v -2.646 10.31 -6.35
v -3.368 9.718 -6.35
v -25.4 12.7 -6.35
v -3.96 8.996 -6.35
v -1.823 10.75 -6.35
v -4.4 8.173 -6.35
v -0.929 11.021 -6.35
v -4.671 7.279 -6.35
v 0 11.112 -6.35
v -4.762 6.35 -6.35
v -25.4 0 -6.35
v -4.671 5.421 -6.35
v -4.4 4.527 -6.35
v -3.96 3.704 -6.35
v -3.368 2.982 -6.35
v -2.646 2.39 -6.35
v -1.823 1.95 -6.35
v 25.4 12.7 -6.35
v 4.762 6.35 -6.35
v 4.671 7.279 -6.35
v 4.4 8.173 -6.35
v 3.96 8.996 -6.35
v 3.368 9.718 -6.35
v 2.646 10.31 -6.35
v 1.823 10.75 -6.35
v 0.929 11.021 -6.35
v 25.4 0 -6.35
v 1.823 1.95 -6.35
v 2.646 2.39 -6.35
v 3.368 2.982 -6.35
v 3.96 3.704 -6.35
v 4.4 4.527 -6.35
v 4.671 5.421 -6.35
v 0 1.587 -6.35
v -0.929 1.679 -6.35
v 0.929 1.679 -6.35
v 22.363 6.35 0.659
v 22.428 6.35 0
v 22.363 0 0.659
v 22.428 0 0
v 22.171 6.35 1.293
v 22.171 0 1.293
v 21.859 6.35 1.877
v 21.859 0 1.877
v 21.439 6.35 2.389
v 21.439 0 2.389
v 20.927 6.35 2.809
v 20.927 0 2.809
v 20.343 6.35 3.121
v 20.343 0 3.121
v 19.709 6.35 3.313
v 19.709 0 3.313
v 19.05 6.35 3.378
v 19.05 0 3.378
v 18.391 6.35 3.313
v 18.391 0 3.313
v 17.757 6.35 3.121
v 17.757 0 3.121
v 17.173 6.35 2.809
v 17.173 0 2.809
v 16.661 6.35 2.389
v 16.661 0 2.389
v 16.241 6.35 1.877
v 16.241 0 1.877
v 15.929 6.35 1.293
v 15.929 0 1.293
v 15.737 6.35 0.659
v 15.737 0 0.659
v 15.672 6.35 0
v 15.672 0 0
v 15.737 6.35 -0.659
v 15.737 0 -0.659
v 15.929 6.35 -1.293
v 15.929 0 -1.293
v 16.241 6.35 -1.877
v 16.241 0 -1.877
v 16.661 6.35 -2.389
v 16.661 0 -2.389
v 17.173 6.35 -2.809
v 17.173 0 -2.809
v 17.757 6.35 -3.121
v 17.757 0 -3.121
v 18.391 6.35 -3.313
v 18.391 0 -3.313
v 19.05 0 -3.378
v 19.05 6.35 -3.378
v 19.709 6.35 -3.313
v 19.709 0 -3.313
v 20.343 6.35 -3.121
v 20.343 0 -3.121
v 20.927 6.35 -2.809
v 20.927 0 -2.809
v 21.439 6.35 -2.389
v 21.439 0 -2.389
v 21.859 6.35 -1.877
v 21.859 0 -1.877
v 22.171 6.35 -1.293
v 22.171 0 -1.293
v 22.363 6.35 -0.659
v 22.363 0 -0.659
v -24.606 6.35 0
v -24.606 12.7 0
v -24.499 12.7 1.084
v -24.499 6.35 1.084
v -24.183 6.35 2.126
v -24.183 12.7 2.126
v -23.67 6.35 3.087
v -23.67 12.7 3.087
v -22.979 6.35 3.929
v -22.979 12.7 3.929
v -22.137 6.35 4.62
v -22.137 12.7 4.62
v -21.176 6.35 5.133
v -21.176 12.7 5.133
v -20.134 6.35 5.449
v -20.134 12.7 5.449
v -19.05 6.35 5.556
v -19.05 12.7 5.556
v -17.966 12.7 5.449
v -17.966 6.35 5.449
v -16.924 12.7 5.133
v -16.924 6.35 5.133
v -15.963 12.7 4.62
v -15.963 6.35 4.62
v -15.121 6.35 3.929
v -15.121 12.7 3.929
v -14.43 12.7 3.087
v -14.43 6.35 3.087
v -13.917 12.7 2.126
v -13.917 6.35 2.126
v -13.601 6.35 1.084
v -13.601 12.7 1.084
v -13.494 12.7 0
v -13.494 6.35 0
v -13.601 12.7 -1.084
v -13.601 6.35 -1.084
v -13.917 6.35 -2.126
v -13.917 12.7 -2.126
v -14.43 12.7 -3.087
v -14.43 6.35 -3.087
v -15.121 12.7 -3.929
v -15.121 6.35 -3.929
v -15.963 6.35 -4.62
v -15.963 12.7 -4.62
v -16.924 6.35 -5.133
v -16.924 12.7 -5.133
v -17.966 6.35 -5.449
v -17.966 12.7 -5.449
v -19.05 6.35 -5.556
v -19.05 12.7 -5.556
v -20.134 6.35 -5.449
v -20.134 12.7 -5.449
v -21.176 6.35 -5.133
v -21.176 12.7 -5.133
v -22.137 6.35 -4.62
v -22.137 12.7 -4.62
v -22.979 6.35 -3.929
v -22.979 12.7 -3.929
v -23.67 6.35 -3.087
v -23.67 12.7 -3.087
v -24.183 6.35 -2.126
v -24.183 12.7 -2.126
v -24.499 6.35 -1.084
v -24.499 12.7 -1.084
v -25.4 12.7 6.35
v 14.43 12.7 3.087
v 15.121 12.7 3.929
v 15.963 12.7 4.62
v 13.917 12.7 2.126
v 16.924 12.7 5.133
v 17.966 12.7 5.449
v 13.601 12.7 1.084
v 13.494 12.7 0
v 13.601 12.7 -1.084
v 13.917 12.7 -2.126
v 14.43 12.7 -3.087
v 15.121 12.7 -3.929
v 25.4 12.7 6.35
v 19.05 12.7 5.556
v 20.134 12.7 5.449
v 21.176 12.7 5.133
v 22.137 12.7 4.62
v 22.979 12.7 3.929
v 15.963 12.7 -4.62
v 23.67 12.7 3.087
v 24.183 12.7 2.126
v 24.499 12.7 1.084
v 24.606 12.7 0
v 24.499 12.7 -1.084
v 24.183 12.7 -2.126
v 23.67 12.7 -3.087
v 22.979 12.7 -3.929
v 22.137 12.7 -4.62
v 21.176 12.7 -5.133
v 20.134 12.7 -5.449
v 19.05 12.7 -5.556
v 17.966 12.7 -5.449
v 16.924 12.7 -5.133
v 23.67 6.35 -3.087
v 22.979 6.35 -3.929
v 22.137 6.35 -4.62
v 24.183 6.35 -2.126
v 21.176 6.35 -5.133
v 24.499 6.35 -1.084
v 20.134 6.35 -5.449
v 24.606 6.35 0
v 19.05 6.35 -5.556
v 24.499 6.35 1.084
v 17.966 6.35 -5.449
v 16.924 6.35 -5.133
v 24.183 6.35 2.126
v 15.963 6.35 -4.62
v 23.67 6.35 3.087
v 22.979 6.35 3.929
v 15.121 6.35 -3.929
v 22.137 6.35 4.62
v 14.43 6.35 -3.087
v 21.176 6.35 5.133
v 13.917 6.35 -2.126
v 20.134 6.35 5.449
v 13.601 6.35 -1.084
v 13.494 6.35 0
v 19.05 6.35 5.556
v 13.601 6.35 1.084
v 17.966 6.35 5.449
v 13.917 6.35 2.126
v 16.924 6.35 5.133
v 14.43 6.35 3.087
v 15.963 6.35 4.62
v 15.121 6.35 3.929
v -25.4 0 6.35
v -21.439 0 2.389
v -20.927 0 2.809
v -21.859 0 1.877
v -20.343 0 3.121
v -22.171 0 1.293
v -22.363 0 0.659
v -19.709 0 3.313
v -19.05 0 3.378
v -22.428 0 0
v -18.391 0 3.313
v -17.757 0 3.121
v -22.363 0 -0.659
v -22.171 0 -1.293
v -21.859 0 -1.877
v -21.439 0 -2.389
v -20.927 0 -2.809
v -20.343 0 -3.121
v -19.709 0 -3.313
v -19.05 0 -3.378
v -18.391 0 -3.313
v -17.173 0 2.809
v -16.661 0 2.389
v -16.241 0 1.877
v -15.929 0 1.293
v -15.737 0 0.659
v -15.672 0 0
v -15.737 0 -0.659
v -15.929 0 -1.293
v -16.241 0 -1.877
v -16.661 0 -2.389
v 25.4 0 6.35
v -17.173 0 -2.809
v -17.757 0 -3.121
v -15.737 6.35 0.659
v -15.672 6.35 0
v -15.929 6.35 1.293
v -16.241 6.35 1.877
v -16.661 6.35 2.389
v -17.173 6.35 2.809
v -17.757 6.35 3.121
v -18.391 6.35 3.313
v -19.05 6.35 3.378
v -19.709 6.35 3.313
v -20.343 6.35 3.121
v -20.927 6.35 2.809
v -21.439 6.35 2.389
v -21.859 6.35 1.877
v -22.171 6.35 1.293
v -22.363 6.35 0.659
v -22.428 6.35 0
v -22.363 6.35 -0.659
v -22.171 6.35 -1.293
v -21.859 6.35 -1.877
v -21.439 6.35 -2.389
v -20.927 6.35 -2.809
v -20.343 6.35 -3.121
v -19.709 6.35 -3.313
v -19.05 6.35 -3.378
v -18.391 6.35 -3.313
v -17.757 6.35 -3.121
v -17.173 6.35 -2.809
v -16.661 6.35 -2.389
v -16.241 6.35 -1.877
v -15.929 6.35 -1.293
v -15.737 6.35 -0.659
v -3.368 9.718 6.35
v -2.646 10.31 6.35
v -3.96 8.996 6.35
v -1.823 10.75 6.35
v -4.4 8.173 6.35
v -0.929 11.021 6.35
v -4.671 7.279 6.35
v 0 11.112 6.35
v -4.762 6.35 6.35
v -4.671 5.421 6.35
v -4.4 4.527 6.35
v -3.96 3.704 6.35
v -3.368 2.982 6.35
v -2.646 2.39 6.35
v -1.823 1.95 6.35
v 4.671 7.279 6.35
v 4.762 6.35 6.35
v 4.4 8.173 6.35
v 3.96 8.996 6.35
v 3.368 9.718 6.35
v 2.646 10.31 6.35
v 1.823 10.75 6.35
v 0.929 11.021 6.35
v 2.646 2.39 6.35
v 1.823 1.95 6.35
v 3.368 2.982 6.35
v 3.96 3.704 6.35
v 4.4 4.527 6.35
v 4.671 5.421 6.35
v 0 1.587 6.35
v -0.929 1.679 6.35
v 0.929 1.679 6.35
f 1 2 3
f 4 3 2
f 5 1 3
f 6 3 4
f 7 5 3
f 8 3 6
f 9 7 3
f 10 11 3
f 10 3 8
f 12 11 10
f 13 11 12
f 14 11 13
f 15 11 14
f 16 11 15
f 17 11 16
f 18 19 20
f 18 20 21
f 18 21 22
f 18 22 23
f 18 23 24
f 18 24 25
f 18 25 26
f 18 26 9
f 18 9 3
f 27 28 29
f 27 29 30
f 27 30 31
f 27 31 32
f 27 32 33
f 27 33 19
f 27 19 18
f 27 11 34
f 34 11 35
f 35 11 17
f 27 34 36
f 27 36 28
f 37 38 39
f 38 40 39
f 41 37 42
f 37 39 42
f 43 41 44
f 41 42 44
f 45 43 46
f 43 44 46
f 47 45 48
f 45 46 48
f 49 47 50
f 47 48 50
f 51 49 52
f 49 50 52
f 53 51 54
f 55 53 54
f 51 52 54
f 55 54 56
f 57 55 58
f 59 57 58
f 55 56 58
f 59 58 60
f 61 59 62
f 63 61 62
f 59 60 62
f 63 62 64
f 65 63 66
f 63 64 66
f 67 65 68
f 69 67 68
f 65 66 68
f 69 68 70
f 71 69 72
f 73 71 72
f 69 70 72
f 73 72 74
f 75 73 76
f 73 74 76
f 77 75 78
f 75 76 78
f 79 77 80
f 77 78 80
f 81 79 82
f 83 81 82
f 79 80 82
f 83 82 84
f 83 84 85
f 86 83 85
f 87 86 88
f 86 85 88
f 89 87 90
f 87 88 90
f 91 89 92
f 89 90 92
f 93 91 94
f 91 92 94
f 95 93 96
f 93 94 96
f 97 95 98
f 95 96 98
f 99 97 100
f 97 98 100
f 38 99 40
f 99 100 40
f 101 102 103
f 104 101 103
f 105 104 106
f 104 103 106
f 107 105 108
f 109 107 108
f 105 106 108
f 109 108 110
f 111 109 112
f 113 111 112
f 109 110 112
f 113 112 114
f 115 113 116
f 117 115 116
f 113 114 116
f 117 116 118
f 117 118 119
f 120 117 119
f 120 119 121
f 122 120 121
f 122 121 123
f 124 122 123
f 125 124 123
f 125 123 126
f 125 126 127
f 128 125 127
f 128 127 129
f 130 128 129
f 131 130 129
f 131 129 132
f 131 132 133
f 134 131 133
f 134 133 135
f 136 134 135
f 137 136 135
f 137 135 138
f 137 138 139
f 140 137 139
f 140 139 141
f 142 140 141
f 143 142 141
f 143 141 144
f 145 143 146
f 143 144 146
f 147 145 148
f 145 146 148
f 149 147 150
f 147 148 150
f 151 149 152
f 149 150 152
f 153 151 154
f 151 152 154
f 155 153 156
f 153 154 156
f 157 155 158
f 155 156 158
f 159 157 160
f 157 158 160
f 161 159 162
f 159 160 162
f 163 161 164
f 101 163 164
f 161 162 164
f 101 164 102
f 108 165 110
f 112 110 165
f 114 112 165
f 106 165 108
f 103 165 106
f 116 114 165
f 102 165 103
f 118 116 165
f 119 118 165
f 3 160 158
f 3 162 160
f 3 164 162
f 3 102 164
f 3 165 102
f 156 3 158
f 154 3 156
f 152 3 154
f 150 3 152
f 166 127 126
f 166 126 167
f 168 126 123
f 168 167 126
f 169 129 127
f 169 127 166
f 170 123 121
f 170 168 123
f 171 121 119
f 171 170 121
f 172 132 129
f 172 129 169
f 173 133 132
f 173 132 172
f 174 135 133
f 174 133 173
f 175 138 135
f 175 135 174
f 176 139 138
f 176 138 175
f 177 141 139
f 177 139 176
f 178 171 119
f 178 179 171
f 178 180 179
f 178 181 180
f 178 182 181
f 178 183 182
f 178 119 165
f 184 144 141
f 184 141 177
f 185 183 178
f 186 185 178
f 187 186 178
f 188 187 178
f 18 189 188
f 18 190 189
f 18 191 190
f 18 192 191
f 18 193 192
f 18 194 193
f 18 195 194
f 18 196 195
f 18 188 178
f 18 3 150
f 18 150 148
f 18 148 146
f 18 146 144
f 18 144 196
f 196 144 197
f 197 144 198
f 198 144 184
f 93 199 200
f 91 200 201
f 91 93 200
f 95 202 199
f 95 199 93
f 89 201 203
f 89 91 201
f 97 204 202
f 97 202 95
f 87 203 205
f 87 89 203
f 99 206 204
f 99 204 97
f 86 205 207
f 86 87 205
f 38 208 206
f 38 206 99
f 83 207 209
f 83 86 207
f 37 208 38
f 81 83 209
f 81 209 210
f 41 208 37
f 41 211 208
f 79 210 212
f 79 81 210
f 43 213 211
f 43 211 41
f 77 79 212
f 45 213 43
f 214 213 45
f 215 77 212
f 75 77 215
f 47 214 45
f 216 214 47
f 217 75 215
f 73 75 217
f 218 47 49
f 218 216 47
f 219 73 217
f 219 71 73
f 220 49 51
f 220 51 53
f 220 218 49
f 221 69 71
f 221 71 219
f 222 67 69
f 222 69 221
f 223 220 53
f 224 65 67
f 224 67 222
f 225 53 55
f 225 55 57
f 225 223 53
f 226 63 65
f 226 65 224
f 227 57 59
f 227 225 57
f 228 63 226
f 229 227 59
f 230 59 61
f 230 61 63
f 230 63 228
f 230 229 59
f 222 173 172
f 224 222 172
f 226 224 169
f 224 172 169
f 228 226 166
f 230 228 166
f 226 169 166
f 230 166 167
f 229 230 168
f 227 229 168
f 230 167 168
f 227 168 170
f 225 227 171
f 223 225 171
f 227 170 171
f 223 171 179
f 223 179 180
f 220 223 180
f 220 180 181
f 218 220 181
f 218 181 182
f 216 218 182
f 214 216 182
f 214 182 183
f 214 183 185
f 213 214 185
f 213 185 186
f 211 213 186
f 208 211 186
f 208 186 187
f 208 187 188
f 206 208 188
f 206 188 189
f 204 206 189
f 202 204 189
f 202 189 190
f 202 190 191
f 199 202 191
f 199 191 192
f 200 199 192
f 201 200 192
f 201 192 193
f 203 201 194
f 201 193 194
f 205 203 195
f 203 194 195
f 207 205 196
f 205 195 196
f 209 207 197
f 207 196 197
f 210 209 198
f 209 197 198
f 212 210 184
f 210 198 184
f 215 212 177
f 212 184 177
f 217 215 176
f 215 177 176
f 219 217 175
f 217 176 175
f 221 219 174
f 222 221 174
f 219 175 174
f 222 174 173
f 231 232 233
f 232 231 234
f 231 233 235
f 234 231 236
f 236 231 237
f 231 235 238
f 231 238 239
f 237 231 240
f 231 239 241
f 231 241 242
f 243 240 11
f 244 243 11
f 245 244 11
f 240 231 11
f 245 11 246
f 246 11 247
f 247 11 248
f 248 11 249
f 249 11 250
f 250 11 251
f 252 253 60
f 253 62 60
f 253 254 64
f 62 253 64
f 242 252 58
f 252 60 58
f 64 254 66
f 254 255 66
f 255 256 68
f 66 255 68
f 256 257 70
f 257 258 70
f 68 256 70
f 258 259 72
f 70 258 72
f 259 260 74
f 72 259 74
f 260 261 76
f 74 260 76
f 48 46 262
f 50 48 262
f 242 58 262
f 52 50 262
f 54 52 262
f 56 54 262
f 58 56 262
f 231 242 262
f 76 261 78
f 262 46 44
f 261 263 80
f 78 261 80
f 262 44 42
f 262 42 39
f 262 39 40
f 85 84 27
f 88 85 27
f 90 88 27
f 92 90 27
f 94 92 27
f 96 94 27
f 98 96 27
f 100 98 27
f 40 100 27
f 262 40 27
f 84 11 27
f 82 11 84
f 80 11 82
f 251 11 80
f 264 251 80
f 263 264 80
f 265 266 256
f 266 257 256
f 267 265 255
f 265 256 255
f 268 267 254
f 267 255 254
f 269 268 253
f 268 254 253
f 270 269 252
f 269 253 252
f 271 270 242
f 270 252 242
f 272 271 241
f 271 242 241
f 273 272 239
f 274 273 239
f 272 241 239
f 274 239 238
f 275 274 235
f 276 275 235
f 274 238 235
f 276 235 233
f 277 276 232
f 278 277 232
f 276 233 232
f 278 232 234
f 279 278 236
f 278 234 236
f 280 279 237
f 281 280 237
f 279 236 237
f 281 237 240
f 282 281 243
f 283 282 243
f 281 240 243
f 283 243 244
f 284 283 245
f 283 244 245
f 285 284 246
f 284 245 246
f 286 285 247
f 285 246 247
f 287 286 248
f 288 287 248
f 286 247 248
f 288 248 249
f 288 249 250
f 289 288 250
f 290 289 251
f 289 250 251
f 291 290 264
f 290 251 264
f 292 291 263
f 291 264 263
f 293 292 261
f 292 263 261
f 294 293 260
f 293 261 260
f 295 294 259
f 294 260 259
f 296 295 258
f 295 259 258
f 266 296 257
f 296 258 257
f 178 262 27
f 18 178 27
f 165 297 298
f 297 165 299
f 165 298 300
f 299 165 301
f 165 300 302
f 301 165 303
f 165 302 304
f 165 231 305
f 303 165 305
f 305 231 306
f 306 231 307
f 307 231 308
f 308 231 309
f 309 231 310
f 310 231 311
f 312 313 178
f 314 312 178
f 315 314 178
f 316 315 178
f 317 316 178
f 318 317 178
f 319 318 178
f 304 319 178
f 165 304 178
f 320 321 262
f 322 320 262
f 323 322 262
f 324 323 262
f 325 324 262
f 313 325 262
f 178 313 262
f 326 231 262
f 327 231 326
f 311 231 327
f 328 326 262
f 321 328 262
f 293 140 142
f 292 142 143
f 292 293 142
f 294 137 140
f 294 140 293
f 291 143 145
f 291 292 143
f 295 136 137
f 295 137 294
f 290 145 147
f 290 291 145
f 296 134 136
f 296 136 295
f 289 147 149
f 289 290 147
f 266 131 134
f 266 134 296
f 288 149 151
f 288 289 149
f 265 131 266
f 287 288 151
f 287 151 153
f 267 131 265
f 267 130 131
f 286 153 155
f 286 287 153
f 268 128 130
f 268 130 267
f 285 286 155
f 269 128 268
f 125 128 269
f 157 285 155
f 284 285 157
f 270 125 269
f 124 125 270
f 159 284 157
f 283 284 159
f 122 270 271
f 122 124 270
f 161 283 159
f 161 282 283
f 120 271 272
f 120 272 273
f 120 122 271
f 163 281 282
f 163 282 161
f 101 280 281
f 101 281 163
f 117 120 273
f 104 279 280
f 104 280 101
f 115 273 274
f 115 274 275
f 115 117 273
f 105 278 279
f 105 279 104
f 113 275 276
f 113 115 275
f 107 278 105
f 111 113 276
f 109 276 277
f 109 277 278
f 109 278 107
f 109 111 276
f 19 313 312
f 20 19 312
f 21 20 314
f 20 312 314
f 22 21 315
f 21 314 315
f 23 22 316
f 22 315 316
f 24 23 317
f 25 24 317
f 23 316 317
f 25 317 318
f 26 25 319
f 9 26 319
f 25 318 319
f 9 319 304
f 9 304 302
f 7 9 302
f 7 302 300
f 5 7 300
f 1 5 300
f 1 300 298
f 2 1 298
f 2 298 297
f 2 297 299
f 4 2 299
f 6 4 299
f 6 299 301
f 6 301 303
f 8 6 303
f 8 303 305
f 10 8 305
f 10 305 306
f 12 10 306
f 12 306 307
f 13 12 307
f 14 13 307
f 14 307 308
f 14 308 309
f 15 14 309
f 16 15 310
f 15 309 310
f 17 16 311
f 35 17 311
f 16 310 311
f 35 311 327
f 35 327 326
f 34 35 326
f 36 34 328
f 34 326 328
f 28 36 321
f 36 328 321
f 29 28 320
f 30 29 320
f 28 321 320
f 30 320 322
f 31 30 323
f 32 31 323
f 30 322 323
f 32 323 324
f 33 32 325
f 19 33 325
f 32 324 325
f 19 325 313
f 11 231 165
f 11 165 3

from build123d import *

# Parameters (mm, degrees)
SKETCH1_W                                        = 50.8
SKETCH1_H                                        = 12.7
EXTRUDE1_DEPTH                                   = 12.7
SKETCH3_R                                        = 4.7625
CUT_EXTRUDE2_DEPTH                               = 32.108519733
CBORE_FOR_1_4_SOCKET_HEAD_CAP_SCREW1_D           = 6.7564
CBORE_FOR_1_4_SOCKET_HEAD_CAP_SCREW1_CBORE_D     = 11.1125
CBORE_FOR_1_4_SOCKET_HEAD_CAP_SCREW1_CBORE_DEPTH = 6.35


with BuildPart() as part:
    # Sketch1 → Extrude1 (new body)
    with BuildSketch(Plane(origin=(0, 0, 0), x_dir=(1, 0, 0), z_dir=(0, 1, 0))):
        Rectangle(SKETCH1_W, SKETCH1_H)
    extrude(amount=EXTRUDE1_DEPTH)

    # Sketch3 → Cut-Extrude2 (cut, through all)
    with BuildSketch(Plane.XY.offset(6.35)):
        with Locations((0, 6.35)):
            Circle(SKETCH3_R)
    extrude(amount=-CUT_EXTRUDE2_DEPTH, mode=Mode.SUBTRACT)

    # CBORE for 1/4 Socket Head Cap Screw1 (through all)
    with Locations(Plane(origin=(0, 12.7, 0), x_dir=(-1, 0, 0), z_dir=(0, 1, 0))):
        with Locations((-19.05, 0), (19.05, 0)):
            CounterBoreHole(CBORE_FOR_1_4_SOCKET_HEAD_CAP_SCREW1_D / 2, CBORE_FOR_1_4_SOCKET_HEAD_CAP_SCREW1_CBORE_D / 2, CBORE_FOR_1_4_SOCKET_HEAD_CAP_SCREW1_CBORE_DEPTH)


solid = part.part
